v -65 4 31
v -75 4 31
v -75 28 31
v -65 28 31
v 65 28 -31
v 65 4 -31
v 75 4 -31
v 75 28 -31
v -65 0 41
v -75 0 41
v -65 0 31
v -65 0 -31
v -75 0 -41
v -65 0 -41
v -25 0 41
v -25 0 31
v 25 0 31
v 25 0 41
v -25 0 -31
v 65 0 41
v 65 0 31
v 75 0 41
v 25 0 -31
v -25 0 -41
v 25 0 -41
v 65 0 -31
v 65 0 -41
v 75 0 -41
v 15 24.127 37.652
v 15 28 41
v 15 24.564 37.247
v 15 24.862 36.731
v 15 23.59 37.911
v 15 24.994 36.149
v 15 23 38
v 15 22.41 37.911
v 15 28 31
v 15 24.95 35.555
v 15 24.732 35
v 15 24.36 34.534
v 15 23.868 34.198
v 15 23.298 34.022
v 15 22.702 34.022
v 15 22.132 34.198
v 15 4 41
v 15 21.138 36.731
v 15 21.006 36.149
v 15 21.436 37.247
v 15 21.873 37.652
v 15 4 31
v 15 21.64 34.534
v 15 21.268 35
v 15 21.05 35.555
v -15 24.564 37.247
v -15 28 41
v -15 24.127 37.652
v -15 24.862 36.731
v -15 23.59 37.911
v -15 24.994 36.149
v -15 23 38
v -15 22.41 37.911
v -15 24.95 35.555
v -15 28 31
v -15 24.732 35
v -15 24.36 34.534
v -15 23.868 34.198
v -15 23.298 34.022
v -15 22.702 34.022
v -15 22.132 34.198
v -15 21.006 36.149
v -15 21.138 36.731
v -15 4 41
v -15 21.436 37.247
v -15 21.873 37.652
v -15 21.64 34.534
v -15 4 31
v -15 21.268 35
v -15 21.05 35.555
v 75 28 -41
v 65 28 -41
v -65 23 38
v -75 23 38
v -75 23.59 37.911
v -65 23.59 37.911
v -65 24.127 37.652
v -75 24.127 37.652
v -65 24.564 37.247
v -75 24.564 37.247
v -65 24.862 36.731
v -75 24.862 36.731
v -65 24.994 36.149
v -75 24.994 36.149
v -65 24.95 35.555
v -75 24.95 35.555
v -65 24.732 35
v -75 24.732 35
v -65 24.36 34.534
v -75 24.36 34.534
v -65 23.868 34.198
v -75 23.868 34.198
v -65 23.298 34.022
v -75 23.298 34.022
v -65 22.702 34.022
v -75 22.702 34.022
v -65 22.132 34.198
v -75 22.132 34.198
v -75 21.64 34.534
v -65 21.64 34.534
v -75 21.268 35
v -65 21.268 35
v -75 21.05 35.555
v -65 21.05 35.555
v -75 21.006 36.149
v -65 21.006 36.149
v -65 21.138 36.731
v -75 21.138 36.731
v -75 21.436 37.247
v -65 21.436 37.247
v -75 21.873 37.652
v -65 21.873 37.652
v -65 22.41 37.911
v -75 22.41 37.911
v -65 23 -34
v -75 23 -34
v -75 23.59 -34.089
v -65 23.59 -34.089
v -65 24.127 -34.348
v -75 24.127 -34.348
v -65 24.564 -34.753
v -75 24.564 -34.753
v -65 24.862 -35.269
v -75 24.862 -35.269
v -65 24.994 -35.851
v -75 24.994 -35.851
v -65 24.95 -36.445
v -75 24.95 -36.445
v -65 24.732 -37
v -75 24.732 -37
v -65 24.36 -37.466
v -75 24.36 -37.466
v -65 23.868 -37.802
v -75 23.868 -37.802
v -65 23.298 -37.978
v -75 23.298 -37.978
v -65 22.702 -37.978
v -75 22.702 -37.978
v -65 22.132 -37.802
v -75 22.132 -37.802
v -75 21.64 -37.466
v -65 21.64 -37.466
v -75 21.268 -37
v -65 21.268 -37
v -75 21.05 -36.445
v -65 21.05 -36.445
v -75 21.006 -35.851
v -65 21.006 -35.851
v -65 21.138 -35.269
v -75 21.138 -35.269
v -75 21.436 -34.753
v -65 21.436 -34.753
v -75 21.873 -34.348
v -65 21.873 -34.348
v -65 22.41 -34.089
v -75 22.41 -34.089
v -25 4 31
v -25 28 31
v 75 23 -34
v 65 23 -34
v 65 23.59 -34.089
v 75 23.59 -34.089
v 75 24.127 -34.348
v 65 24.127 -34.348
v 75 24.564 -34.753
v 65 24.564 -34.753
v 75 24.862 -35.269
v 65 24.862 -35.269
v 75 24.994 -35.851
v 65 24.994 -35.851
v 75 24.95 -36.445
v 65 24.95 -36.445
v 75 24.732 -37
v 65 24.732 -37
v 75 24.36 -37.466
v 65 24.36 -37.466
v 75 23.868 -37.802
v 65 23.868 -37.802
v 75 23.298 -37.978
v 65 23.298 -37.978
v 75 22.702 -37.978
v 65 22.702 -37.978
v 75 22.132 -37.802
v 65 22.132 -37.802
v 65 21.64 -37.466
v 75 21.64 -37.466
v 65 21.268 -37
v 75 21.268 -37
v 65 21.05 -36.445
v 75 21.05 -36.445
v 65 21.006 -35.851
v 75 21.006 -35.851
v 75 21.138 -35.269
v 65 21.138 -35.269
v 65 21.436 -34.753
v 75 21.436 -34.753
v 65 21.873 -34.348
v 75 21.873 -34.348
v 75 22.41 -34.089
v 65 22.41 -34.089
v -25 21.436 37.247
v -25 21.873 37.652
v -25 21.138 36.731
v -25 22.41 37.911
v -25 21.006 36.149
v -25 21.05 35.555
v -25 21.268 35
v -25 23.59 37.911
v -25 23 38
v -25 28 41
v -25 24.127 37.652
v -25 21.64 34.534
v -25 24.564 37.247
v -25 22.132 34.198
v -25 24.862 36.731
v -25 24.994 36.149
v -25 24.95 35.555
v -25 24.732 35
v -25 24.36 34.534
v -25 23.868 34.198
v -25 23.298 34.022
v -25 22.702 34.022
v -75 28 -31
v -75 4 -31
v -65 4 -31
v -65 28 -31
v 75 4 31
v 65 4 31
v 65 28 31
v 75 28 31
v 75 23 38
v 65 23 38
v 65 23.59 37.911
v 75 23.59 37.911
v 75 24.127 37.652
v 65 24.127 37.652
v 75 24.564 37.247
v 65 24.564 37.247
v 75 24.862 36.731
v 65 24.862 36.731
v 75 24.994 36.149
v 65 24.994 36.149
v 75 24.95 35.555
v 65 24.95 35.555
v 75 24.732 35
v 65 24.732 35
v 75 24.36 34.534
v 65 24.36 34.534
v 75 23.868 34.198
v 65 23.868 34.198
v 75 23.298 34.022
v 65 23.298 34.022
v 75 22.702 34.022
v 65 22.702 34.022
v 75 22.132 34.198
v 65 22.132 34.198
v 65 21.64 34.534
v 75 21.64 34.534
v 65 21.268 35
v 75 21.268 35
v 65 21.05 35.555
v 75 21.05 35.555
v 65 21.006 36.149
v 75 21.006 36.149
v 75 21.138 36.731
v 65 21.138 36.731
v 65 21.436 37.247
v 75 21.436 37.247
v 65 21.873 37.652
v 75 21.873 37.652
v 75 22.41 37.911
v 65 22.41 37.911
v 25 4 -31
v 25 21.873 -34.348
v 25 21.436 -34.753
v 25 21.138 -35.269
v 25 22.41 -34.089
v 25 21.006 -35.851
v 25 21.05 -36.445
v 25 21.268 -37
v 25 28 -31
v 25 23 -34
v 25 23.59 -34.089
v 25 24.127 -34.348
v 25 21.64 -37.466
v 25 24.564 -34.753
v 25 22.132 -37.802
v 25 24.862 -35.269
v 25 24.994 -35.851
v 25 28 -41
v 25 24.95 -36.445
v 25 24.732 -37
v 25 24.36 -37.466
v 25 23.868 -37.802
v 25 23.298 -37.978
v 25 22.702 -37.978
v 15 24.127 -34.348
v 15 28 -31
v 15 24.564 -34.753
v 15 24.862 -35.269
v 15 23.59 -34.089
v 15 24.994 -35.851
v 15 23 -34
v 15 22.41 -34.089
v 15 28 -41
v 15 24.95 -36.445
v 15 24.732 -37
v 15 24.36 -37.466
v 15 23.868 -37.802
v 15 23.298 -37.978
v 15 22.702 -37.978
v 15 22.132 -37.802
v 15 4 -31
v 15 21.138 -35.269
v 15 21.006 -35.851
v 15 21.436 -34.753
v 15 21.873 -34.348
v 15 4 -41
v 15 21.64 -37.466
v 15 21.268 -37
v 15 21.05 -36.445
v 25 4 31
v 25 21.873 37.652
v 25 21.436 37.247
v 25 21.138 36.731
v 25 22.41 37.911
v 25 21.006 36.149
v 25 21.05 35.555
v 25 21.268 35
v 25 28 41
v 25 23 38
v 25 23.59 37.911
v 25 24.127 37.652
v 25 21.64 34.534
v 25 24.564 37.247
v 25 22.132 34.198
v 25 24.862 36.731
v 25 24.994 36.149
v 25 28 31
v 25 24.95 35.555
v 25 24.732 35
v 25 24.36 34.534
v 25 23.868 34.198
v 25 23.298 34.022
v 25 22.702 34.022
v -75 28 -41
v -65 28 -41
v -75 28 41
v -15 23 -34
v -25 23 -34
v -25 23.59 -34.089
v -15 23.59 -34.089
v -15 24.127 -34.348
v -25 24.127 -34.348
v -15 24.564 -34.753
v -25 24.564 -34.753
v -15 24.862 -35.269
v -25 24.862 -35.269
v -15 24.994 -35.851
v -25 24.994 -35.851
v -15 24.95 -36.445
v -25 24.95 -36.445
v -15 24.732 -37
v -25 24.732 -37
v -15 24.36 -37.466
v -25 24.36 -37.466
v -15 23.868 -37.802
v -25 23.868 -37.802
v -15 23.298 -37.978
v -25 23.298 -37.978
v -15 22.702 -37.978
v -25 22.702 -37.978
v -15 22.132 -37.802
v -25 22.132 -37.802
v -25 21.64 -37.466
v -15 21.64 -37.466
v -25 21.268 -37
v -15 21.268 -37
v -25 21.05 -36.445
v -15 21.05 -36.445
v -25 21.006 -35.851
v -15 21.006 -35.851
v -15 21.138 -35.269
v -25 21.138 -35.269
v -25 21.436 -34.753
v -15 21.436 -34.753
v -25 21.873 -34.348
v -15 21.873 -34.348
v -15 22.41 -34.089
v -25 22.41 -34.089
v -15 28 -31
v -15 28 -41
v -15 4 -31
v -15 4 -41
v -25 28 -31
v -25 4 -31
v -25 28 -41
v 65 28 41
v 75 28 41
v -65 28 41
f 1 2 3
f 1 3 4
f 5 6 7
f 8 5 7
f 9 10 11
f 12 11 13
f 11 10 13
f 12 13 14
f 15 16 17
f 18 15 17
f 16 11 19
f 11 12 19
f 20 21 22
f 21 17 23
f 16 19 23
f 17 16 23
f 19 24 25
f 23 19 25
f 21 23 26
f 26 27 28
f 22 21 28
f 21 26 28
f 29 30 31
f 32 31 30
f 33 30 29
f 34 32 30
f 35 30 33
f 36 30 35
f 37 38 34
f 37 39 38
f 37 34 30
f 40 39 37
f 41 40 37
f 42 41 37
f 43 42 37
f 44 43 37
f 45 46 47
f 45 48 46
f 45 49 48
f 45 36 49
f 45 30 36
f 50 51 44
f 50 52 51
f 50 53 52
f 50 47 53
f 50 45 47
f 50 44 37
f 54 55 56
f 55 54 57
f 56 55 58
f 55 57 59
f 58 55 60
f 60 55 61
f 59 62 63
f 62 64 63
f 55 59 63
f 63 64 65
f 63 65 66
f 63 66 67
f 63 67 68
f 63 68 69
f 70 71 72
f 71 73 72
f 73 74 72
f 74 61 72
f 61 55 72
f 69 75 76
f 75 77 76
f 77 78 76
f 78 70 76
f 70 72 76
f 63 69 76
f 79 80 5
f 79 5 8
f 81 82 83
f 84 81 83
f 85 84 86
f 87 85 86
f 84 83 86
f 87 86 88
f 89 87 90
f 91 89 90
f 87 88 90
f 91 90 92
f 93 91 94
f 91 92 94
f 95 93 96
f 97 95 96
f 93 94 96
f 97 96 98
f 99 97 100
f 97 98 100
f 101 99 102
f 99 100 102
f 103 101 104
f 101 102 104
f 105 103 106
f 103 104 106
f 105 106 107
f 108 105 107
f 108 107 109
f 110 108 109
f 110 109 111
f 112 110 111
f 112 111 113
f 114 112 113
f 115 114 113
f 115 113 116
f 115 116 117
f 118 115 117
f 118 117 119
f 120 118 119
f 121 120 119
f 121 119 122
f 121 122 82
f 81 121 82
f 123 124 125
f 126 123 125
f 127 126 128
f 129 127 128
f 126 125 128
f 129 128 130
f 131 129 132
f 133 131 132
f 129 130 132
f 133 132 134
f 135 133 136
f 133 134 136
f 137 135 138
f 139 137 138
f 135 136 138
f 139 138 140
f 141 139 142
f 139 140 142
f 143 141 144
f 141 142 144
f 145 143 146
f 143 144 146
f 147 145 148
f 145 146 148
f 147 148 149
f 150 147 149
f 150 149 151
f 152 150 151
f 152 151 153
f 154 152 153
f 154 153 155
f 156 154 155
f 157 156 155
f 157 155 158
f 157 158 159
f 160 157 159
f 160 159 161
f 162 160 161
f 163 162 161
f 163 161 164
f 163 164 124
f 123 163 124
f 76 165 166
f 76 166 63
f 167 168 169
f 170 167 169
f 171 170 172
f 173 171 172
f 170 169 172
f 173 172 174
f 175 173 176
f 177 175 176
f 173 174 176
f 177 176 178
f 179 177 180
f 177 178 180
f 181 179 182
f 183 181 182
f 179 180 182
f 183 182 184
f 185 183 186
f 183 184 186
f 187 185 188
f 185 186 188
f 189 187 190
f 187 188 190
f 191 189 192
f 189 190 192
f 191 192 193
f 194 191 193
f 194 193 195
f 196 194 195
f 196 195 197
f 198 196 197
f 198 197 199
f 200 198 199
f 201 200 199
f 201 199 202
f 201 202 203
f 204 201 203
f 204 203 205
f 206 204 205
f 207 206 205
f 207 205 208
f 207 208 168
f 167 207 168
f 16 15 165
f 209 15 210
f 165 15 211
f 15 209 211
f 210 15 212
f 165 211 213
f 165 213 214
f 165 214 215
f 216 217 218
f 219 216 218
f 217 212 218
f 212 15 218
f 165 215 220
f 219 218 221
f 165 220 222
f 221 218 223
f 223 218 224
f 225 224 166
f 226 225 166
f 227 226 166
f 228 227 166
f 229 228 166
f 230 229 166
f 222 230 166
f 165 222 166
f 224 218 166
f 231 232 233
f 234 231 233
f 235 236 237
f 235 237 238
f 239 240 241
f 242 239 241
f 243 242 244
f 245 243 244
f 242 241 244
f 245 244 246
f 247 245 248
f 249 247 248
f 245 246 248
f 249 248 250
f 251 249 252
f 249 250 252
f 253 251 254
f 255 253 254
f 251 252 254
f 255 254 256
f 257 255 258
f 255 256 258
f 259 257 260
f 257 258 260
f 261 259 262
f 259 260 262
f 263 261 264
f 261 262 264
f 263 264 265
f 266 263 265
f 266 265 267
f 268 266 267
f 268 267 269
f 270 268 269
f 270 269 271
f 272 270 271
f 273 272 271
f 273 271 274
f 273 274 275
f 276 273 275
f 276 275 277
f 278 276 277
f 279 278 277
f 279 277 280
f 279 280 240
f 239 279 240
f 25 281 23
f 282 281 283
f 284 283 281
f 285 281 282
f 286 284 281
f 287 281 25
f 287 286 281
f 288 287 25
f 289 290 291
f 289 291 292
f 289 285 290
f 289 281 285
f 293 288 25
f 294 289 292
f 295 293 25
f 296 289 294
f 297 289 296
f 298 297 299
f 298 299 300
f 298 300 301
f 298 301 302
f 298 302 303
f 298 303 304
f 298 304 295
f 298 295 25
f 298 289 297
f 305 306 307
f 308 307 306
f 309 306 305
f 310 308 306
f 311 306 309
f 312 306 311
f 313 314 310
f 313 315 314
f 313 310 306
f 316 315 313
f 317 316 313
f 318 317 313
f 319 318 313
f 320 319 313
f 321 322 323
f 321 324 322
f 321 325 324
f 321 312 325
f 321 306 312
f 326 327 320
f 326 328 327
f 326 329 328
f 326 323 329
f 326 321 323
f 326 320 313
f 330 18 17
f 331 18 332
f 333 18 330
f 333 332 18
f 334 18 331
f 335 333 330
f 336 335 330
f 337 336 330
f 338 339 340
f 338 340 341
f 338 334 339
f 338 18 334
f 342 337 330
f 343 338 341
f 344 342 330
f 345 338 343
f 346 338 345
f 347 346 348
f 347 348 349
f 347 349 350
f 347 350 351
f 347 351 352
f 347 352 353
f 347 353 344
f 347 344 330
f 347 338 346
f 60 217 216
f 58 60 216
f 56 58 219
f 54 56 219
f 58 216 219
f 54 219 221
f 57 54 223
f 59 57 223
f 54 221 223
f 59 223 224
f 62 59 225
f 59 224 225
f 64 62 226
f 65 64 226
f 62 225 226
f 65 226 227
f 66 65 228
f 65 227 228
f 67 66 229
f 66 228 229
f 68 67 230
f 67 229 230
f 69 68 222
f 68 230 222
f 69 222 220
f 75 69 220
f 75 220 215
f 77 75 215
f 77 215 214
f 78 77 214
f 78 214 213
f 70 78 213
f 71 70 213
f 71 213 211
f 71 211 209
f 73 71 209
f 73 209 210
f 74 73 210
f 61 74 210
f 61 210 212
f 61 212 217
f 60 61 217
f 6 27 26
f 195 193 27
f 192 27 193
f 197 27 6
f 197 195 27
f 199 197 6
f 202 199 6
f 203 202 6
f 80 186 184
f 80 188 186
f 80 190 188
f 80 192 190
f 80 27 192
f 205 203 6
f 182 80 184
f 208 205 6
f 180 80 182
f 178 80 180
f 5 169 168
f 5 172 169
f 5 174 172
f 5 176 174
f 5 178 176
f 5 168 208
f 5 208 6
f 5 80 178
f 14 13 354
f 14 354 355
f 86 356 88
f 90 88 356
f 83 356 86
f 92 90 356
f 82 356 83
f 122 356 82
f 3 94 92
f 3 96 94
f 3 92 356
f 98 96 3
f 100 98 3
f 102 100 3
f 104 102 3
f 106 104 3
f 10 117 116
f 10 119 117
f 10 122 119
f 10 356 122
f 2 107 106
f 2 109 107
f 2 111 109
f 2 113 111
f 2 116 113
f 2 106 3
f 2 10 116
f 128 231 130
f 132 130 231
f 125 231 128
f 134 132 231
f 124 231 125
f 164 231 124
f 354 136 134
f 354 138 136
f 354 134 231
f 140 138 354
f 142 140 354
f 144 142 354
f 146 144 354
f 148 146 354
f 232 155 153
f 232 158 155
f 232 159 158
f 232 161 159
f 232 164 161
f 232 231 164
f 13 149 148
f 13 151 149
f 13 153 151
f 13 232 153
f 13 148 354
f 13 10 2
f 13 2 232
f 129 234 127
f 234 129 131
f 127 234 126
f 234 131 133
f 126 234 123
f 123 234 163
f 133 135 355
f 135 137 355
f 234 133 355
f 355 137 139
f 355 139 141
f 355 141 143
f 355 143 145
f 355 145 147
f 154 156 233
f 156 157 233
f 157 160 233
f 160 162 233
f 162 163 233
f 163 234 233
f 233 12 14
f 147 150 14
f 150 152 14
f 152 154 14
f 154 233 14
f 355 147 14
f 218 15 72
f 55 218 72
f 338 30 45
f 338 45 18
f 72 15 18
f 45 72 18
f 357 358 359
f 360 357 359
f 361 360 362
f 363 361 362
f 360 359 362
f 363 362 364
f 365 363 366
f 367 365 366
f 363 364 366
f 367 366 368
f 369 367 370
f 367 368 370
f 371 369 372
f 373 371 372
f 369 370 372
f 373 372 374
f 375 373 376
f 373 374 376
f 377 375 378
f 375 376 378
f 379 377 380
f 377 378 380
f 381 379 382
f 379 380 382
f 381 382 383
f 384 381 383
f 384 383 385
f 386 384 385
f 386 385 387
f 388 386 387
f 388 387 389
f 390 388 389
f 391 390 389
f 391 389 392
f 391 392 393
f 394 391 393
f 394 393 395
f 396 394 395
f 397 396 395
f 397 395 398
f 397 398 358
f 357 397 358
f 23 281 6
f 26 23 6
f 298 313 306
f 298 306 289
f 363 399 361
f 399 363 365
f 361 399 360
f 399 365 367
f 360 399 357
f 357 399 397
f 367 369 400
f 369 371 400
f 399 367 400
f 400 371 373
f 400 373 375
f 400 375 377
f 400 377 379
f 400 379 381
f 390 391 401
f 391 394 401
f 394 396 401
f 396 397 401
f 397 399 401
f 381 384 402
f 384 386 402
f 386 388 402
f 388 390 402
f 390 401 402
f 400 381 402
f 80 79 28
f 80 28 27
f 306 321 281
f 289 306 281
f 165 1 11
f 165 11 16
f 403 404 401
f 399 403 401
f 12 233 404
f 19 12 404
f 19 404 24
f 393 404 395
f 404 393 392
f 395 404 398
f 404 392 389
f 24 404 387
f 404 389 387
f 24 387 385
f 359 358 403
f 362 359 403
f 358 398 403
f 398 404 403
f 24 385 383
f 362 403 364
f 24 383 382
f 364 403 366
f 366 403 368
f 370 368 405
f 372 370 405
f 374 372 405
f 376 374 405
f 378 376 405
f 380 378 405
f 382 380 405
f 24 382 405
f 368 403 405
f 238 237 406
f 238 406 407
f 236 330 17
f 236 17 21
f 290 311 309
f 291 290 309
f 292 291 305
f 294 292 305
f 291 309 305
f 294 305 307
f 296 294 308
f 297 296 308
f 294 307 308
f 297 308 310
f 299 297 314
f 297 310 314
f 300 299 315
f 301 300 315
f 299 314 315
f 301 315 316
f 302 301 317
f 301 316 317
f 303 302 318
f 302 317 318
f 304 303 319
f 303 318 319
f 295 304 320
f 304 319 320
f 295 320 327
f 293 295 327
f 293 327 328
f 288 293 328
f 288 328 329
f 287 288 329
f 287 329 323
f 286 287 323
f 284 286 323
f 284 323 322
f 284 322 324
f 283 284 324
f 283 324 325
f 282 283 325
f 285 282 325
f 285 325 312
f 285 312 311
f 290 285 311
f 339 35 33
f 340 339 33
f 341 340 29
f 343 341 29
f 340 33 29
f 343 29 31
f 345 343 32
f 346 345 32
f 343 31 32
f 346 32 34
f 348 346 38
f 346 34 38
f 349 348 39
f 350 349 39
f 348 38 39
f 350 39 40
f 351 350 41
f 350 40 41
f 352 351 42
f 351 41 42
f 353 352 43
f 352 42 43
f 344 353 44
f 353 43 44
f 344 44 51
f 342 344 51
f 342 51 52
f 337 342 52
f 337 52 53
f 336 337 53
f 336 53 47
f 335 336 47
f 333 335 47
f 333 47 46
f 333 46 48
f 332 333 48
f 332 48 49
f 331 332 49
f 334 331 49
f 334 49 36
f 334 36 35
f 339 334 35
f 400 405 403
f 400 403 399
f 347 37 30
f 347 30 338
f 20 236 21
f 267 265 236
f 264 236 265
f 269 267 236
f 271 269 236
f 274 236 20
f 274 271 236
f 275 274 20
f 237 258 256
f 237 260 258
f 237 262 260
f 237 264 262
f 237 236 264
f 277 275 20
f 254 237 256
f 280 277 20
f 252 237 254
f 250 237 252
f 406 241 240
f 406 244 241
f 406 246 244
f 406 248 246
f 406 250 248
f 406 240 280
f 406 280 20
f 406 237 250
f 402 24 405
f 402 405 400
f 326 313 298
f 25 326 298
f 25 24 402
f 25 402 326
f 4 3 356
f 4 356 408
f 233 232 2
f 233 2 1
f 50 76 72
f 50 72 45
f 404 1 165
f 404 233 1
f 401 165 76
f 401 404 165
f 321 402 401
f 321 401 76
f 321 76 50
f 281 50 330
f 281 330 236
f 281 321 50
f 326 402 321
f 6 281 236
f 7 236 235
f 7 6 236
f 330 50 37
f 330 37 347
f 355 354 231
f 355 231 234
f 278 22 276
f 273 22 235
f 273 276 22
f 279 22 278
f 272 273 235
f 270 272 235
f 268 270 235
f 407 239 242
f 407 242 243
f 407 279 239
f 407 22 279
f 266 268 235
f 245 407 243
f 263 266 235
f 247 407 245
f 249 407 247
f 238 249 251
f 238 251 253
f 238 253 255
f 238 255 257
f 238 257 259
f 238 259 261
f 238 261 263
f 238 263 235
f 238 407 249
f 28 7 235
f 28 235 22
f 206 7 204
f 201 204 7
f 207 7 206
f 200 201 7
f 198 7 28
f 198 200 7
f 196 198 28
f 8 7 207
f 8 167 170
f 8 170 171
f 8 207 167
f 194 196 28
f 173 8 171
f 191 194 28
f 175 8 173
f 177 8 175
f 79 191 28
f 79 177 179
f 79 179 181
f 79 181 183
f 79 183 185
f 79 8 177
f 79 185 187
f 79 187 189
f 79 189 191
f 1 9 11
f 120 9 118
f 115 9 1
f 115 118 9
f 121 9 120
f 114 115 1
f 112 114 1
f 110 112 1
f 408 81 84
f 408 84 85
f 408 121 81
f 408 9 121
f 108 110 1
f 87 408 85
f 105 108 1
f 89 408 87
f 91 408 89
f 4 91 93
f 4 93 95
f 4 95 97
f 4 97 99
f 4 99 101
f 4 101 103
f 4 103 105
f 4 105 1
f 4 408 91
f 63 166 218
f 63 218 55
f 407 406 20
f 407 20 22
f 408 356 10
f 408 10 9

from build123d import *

# Parameters (mm, degrees)
SKETCH1_W           = 130
SKETCH1_H           = 82
BOSS_EXTRUDE1_DEPTH = 4
SKETCH2_W           = 40
SKETCH2_H           = 10
CUT_EXTRUDE1_DEPTH  = 24
BOSS_EXTRUDE2_DEPTH = 4
SKETCH4_W           = 10
SKETCH4_H           = 10
BOSS_EXTRUDE3_DEPTH = 24
SKETCH5_R           = 2
CUT_EXTRUDE2_DEPTH  = 151


with BuildPart() as part:
    # Sketch1 → Boss-Extrude1 (new body)
    with BuildSketch(Plane(origin=(0, 0, 0), x_dir=(1, 0, 0), z_dir=(0, 1, 0))):
        Rectangle(SKETCH1_W, SKETCH1_H)
    extrude(amount=BOSS_EXTRUDE1_DEPTH)

    # Sketch2 → Cut-Extrude1 (cut)
    with BuildSketch(Plane(origin=(0, 4, 0), x_dir=(1, 0, 0), z_dir=(0, 1, 0))):
        with Locations((-45, 36)):
            Rectangle(SKETCH2_W, SKETCH2_H)
        with Locations((45, 36)):
            Rectangle(SKETCH2_W, SKETCH2_H)
        with Locations((45, -36)):
            Rectangle(SKETCH2_W, SKETCH2_H)
        with Locations((-45, -36)):
            Rectangle(SKETCH2_W, SKETCH2_H)
    extrude(amount=-CUT_EXTRUDE1_DEPTH, mode=Mode.SUBTRACT)

    # Sketch3 → Boss-Extrude2 (add)
    with BuildSketch(Plane(origin=(0, 4, 0), x_dir=(1, 0, 0), z_dir=(0, 1, 0))):
        Polygon((-65, -31), (-65, 31), (-65, 41), (-75, 41), (-75, -41), (-65, -41), align=None)
        Polygon((75, 41), (65, 41), (65, 31), (65, -31), (65, -41), (75, -41), align=None)
    extrude(amount=-BOSS_EXTRUDE2_DEPTH)

    # Sketch4 → Boss-Extrude3 (add)
    with BuildSketch(Plane(origin=(0, 4, 0), x_dir=(1, 0, 0), z_dir=(0, 1, 0))):
        with Locations((-70, 36)):
            Rectangle(SKETCH4_W, SKETCH4_H)
        with Locations((-20, 36)):
            Rectangle(SKETCH4_W, SKETCH4_H)
        with Locations((20, 36)):
            Rectangle(SKETCH4_W, SKETCH4_H)
        with Locations((70, 36)):
            Rectangle(SKETCH4_W, SKETCH4_H)
        with Locations((70, -36)):
            Rectangle(SKETCH4_W, SKETCH4_H)
        with Locations((20, -36)):
            Rectangle(SKETCH4_W, SKETCH4_H)
        with Locations((-20, -36)):
            Rectangle(SKETCH4_W, SKETCH4_H)
        with Locations((-70, -36)):
            Rectangle(SKETCH4_W, SKETCH4_H)
    extrude(amount=BOSS_EXTRUDE3_DEPTH)

    # Sketch5 → Cut-Extrude2 (cut, through all)
    with BuildSketch(Plane.ZY.offset(75)):
        with Locations((-36, 23)):
            Circle(SKETCH5_R)
        with Locations((36, 23)):
            Circle(SKETCH5_R)
    extrude(amount=-CUT_EXTRUDE2_DEPTH, mode=Mode.SUBTRACT)


solid = part.part
